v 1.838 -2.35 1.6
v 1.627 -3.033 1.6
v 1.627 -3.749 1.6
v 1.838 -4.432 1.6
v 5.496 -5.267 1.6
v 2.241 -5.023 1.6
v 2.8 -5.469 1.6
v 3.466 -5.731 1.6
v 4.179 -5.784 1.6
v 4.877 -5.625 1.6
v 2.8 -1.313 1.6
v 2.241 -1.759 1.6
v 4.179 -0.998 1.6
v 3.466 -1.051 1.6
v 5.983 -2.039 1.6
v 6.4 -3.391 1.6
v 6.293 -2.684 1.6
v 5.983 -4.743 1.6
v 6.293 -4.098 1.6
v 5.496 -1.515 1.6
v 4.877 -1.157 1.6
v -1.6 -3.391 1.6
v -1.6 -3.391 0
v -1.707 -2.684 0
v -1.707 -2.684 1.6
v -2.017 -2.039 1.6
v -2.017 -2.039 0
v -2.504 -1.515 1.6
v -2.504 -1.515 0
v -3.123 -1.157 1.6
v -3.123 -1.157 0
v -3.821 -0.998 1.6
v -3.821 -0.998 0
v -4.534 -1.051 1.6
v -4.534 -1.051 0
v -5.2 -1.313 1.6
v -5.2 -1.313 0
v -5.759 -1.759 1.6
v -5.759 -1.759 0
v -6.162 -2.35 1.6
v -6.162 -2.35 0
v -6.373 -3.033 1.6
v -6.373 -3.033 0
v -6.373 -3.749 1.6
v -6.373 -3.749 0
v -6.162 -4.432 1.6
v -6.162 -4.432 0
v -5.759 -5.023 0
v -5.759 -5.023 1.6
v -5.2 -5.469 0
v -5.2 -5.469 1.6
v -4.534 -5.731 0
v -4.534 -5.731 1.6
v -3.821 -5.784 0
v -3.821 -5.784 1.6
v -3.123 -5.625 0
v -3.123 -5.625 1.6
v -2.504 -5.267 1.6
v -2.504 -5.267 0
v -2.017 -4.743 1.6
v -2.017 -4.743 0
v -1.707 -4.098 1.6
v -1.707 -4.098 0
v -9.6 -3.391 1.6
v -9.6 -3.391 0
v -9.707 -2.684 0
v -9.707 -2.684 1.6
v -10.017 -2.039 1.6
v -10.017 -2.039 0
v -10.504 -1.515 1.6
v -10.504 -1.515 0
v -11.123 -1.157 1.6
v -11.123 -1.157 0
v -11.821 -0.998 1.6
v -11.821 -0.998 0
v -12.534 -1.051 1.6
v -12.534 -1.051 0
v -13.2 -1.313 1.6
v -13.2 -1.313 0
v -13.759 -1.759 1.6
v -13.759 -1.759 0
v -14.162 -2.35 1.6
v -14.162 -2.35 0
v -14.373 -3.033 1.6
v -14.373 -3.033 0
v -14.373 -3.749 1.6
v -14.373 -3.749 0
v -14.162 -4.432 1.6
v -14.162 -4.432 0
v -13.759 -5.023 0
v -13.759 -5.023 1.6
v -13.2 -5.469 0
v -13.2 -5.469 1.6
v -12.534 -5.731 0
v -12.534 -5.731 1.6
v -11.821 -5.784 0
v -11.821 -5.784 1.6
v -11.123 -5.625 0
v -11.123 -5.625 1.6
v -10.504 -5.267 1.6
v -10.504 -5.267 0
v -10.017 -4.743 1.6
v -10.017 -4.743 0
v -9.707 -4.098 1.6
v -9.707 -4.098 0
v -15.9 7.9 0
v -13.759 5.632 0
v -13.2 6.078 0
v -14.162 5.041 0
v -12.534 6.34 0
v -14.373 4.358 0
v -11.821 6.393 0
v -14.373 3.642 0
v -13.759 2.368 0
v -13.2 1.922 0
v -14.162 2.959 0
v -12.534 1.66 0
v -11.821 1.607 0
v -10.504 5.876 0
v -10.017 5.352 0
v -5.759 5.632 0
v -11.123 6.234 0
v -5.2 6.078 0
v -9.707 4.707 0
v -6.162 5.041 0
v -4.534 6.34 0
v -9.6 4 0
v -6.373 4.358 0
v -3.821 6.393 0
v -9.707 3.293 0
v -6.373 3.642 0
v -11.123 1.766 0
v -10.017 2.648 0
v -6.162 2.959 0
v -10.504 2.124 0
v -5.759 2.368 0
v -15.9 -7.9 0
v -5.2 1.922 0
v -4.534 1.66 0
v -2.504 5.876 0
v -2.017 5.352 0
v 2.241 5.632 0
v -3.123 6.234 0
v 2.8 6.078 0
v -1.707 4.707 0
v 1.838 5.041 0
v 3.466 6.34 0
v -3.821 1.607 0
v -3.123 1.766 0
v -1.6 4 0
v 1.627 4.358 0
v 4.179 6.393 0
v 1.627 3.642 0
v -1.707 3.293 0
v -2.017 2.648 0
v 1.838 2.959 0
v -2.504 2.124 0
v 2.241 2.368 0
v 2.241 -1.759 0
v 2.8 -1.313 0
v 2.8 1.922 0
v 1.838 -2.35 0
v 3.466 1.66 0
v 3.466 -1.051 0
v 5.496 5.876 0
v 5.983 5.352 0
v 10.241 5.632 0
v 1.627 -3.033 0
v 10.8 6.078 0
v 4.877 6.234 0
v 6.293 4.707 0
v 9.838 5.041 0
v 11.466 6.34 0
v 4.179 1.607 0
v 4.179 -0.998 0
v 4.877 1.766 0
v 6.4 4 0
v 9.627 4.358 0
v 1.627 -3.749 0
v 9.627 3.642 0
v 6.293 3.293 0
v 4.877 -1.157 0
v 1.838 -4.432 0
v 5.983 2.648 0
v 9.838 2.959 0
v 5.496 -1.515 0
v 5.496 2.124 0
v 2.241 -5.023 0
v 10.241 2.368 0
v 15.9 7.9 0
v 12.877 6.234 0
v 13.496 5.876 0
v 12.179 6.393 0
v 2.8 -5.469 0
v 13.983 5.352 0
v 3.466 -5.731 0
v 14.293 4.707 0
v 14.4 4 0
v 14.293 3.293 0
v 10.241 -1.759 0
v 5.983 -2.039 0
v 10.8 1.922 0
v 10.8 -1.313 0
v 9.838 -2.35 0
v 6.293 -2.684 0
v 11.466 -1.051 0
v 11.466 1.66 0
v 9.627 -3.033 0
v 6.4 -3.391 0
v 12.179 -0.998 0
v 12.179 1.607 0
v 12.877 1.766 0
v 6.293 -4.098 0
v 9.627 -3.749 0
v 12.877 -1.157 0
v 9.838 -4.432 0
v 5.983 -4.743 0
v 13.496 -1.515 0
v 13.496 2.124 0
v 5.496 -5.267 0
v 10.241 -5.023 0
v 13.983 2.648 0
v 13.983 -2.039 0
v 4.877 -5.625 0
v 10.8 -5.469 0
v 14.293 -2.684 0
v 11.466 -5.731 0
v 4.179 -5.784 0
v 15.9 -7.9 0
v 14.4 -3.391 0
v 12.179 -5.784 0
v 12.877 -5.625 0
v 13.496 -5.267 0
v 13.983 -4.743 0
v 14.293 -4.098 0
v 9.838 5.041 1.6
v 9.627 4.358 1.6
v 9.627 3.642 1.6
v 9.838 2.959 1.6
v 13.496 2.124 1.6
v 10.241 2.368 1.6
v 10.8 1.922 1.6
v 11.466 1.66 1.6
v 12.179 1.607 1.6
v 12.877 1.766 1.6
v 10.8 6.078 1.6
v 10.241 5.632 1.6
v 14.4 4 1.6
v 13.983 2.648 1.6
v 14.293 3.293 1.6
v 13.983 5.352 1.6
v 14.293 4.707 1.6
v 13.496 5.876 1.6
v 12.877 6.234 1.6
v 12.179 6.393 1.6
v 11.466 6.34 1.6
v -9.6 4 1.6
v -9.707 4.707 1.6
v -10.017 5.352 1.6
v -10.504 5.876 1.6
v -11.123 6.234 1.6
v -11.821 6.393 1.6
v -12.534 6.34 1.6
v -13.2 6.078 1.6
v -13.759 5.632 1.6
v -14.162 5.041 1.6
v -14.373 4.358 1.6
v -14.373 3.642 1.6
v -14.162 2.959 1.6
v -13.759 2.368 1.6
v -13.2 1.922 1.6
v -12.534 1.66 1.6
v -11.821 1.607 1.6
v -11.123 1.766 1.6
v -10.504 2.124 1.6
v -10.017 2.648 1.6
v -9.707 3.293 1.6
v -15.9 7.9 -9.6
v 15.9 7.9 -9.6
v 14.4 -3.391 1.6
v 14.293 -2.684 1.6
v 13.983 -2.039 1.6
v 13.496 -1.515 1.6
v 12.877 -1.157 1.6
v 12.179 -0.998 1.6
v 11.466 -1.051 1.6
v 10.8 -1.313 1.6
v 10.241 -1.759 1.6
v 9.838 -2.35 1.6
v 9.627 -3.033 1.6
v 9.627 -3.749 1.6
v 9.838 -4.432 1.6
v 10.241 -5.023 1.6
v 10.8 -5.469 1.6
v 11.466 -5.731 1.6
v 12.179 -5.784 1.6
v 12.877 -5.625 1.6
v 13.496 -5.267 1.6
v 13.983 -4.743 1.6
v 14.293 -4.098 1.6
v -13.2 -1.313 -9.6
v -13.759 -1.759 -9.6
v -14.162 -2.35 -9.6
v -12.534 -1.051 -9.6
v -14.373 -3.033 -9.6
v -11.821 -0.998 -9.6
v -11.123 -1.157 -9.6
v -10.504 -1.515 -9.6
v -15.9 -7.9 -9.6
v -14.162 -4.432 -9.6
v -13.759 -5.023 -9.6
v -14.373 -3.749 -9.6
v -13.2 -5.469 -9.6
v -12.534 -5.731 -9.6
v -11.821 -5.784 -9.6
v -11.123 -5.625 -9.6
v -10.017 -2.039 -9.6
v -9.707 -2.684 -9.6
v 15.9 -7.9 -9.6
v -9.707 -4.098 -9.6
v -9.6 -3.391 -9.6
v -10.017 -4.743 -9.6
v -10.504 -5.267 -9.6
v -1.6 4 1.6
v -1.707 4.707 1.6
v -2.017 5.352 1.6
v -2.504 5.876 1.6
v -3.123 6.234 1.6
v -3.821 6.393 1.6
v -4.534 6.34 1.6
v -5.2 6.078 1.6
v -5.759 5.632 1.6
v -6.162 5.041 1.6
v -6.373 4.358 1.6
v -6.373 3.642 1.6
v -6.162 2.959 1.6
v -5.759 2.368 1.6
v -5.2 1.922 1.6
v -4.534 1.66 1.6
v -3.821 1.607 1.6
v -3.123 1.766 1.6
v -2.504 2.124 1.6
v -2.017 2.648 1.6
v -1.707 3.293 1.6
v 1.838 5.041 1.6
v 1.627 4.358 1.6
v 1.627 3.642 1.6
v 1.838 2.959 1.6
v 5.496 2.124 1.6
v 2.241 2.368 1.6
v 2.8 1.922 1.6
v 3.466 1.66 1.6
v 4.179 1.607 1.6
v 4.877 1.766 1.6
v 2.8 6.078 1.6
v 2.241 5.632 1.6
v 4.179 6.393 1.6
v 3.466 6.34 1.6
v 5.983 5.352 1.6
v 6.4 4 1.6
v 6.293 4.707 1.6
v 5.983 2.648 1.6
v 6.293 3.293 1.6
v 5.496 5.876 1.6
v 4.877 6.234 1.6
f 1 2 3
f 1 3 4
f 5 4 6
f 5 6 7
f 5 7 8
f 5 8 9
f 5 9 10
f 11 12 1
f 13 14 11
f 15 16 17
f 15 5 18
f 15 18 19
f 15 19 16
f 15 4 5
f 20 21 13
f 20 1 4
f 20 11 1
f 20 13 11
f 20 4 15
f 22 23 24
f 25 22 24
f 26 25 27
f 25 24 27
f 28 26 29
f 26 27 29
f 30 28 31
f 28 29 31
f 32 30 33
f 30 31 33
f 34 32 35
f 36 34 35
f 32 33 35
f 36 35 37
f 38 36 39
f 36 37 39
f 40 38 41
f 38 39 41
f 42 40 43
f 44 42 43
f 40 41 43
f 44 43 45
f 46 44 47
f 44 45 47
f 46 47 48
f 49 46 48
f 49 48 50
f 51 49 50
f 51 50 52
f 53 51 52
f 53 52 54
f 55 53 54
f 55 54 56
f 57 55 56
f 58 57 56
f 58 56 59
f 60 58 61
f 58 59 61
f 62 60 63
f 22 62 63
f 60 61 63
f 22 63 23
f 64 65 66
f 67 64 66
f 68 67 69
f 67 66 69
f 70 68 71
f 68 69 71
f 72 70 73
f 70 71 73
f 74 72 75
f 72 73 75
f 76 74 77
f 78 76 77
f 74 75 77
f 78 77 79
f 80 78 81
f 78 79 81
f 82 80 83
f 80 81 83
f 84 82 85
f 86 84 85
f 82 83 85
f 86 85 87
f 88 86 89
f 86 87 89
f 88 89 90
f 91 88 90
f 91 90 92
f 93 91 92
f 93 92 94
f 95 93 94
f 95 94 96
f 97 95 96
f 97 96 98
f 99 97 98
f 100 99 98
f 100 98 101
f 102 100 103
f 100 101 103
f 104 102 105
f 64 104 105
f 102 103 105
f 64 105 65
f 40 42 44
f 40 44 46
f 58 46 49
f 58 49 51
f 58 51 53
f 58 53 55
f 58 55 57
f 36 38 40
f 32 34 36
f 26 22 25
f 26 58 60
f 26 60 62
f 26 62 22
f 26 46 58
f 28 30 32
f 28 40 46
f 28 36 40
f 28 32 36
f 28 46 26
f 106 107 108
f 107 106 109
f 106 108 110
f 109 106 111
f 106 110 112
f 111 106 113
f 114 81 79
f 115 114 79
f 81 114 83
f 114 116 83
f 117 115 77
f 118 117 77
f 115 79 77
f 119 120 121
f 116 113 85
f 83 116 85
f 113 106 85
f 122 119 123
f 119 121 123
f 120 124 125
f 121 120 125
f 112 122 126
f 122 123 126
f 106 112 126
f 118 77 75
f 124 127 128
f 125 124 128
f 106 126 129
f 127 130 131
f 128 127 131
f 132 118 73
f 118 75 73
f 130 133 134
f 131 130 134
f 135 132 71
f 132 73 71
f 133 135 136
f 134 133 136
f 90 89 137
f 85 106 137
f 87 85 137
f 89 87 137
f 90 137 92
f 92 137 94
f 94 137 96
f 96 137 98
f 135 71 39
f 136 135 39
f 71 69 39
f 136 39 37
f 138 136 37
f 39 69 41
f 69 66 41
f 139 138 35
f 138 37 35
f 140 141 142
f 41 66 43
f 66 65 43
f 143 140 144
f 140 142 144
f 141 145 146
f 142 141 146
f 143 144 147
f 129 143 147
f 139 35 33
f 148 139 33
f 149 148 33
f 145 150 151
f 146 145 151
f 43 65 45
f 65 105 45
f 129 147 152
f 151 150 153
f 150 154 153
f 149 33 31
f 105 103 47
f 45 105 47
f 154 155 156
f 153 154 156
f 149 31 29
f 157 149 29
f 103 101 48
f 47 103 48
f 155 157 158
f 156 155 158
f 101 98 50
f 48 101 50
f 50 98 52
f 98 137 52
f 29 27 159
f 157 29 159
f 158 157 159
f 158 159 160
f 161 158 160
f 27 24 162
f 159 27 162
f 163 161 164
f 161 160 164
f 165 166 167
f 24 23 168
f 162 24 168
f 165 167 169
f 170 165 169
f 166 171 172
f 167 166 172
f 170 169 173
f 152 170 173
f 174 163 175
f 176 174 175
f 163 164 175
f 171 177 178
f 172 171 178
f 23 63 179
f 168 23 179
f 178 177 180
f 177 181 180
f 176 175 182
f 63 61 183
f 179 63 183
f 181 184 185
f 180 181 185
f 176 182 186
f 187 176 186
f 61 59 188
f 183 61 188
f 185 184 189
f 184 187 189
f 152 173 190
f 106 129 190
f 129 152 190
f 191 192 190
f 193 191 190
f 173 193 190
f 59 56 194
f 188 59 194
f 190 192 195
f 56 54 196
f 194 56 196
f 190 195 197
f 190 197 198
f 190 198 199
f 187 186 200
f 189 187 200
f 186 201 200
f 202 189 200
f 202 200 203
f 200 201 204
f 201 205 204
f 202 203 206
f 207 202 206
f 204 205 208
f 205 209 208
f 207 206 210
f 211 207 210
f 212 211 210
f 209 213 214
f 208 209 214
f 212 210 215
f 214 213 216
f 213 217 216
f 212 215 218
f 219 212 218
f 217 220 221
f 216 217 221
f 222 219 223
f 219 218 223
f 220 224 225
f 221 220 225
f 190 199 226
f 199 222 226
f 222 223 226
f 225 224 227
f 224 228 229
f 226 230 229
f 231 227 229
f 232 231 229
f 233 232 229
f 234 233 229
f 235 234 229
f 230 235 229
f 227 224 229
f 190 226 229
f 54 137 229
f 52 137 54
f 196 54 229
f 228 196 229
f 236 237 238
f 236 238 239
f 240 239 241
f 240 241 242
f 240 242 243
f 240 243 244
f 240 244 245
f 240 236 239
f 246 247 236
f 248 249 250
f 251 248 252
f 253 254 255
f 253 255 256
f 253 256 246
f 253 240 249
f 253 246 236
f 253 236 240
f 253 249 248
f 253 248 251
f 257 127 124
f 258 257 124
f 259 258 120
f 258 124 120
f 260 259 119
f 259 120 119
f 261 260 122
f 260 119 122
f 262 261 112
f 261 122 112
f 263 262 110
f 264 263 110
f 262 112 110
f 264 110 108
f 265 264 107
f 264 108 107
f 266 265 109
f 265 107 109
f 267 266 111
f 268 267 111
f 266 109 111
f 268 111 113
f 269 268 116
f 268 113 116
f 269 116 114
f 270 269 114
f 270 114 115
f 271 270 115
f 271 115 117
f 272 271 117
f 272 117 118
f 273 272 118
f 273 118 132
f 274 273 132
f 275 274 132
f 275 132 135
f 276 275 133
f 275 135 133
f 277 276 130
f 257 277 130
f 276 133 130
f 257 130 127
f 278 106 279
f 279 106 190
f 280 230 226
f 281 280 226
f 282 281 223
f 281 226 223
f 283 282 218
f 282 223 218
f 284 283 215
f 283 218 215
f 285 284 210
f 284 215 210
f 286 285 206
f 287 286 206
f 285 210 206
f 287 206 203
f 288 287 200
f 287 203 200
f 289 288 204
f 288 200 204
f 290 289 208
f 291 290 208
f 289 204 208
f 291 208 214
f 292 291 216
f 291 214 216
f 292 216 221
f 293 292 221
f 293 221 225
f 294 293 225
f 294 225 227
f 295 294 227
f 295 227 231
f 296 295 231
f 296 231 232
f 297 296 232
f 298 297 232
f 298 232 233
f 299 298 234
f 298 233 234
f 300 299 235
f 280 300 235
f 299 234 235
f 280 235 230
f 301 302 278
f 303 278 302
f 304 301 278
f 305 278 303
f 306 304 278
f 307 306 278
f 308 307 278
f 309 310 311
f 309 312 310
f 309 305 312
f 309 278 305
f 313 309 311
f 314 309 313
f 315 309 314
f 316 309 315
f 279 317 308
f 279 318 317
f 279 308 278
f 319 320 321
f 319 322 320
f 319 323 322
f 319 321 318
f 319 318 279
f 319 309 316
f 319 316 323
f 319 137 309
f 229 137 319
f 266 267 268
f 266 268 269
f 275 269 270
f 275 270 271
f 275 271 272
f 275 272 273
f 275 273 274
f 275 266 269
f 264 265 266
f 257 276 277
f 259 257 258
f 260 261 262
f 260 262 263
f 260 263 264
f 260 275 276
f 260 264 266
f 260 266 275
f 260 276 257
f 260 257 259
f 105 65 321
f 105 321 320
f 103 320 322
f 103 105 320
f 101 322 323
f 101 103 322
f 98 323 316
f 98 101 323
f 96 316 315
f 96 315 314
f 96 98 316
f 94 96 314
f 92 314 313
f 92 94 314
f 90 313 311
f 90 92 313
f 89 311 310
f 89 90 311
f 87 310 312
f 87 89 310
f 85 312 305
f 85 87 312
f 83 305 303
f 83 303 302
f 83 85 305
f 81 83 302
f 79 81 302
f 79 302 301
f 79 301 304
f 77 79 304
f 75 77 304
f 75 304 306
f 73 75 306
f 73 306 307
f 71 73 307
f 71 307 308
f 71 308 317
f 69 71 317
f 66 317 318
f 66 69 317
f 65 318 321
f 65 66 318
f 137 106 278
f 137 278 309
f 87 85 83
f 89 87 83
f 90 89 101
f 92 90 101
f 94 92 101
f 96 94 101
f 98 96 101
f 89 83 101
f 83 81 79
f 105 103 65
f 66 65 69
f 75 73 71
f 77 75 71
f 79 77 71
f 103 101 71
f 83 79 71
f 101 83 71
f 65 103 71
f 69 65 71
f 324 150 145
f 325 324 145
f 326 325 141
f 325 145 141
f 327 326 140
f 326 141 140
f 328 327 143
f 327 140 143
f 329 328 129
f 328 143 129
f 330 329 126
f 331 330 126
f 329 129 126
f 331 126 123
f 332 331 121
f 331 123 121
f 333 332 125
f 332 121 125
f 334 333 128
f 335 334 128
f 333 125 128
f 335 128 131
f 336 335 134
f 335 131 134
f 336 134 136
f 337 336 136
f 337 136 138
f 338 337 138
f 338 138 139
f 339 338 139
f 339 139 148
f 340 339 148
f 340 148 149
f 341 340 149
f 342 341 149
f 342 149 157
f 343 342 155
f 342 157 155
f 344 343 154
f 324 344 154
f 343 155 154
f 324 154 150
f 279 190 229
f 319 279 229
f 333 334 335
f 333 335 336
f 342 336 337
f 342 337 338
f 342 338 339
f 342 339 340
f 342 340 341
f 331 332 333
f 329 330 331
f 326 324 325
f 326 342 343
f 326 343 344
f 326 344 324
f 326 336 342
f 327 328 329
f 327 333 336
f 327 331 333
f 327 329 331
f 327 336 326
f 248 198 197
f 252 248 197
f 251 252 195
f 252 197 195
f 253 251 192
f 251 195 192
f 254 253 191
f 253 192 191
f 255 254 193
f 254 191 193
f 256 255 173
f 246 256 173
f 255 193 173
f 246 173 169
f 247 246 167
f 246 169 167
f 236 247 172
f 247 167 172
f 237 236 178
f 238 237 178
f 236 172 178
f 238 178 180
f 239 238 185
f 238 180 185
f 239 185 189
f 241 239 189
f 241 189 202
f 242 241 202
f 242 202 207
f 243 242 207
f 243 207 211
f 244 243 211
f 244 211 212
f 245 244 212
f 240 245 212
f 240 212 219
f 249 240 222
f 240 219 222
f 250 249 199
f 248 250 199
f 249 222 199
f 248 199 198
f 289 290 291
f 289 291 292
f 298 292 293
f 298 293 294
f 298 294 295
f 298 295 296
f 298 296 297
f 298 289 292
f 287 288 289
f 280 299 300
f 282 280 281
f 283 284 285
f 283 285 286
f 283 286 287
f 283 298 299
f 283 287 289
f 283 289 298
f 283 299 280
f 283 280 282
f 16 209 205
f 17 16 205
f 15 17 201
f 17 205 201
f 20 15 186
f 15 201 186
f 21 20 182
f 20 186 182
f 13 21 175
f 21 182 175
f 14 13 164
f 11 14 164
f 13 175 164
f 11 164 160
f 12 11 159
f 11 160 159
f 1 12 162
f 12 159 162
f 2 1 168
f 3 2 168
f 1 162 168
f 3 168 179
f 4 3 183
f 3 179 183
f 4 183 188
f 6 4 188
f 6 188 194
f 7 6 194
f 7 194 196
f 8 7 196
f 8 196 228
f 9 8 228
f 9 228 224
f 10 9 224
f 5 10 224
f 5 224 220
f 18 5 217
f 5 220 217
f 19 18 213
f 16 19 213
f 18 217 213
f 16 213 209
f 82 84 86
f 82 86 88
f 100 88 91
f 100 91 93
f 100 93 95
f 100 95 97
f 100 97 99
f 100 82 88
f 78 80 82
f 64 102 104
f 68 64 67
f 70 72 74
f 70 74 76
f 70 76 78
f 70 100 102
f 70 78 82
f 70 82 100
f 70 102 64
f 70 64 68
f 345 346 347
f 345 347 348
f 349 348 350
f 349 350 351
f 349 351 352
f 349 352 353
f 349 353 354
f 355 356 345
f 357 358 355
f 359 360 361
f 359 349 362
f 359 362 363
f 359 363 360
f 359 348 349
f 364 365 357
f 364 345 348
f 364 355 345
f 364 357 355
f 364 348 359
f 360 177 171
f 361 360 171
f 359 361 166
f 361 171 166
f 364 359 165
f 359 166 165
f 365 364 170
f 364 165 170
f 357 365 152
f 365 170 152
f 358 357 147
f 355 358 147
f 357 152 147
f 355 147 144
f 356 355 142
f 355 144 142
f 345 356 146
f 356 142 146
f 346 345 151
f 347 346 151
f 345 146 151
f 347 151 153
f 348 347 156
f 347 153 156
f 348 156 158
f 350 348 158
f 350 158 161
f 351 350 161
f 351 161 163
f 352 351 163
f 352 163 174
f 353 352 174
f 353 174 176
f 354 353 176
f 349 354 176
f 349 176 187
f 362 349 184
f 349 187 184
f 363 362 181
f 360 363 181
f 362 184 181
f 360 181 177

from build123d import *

# Parameters (mm, degrees)
F0_R     = 2.4
F1_DEPTH = 1.6
F2_W     = 31.8
F2_H     = 15.8
F2_W_2   = 29.5992456377
F2_H_2   = 13.7376701459
F2_R     = 2.4
F3_DEPTH = 9.6


with BuildPart() as f1:
    # F0 (on Top) → F1 (new body)
    with BuildSketch(Plane.XY):
        with Locations((-12, -3.39098)):
            Circle(F0_R)
    extrude(amount=F1_DEPTH)



with BuildPart() as f1b:
    # F0 (on Top) → F1, piece 2 (new body)
    with BuildSketch(Plane.XY):
        with Locations((-12, 4)):
            Circle(F0_R)
    extrude(amount=F1_DEPTH)


with BuildPart() as f1c:
    # F0 (on Top) → F1, piece 3 (new body)
    with BuildSketch(Plane.XY):
        with Locations((-4, 4)):
            Circle(F0_R)
    extrude(amount=F1_DEPTH)


with BuildPart() as f1d:
    # F0 (on Top) → F1, piece 4 (new body)
    with BuildSketch(Plane.XY):
        with Locations((-4, -3.39098)):
            Circle(F0_R)
    extrude(amount=F1_DEPTH)


with BuildPart() as f1e:
    # F0 (on Top) → F1, piece 5 (new body)
    with BuildSketch(Plane.XY):
        with Locations((4, -3.39098)):
            Circle(F0_R)
    extrude(amount=F1_DEPTH)


with BuildPart() as f1f:
    # F0 (on Top) → F1, piece 6 (new body)
    with BuildSketch(Plane.XY):
        with Locations((4, 4)):
            Circle(F0_R)
    extrude(amount=F1_DEPTH)


with BuildPart() as f1g:
    # F0 (on Top) → F1, piece 7 (new body)
    with BuildSketch(Plane.XY):
        with Locations((12, 4)):
            Circle(F0_R)
    extrude(amount=F1_DEPTH)


with BuildPart() as f1h:
    # F0 (on Top) → F1, piece 8 (new body)
    with BuildSketch(Plane.XY):
        with Locations((12, -3.39098)):
            Circle(F0_R)
    extrude(amount=F1_DEPTH)


with BuildPart() as f1_1:
    add(f1.part)

    add(f1b.part)  # F3 merges F1b

    add(f1c.part)  # F3 merges F1c

    add(f1d.part)  # F3 merges F1d

    add(f1e.part)  # F3 merges F1e

    add(f1f.part)  # F3 merges F1f

    add(f1g.part)  # F3 merges F1g

    add(f1h.part)  # F3 merges F1h
    # F2 (on face) → F3 (join)
    with BuildSketch(Plane(origin=(0, 0, 0), x_dir=(1, 0, 0), z_dir=(0, 0, -1))):
        Rectangle(F2_W, F2_H)
        Rectangle(F2_W_2, F2_H_2, mode=Mode.SUBTRACT)
        Rectangle(F2_W_2, F2_H_2)
        with Locations((-12, 3.39098)):
            Circle(F2_R, mode=Mode.SUBTRACT)
    extrude(amount=F3_DEPTH)


solid = f1_1.part
